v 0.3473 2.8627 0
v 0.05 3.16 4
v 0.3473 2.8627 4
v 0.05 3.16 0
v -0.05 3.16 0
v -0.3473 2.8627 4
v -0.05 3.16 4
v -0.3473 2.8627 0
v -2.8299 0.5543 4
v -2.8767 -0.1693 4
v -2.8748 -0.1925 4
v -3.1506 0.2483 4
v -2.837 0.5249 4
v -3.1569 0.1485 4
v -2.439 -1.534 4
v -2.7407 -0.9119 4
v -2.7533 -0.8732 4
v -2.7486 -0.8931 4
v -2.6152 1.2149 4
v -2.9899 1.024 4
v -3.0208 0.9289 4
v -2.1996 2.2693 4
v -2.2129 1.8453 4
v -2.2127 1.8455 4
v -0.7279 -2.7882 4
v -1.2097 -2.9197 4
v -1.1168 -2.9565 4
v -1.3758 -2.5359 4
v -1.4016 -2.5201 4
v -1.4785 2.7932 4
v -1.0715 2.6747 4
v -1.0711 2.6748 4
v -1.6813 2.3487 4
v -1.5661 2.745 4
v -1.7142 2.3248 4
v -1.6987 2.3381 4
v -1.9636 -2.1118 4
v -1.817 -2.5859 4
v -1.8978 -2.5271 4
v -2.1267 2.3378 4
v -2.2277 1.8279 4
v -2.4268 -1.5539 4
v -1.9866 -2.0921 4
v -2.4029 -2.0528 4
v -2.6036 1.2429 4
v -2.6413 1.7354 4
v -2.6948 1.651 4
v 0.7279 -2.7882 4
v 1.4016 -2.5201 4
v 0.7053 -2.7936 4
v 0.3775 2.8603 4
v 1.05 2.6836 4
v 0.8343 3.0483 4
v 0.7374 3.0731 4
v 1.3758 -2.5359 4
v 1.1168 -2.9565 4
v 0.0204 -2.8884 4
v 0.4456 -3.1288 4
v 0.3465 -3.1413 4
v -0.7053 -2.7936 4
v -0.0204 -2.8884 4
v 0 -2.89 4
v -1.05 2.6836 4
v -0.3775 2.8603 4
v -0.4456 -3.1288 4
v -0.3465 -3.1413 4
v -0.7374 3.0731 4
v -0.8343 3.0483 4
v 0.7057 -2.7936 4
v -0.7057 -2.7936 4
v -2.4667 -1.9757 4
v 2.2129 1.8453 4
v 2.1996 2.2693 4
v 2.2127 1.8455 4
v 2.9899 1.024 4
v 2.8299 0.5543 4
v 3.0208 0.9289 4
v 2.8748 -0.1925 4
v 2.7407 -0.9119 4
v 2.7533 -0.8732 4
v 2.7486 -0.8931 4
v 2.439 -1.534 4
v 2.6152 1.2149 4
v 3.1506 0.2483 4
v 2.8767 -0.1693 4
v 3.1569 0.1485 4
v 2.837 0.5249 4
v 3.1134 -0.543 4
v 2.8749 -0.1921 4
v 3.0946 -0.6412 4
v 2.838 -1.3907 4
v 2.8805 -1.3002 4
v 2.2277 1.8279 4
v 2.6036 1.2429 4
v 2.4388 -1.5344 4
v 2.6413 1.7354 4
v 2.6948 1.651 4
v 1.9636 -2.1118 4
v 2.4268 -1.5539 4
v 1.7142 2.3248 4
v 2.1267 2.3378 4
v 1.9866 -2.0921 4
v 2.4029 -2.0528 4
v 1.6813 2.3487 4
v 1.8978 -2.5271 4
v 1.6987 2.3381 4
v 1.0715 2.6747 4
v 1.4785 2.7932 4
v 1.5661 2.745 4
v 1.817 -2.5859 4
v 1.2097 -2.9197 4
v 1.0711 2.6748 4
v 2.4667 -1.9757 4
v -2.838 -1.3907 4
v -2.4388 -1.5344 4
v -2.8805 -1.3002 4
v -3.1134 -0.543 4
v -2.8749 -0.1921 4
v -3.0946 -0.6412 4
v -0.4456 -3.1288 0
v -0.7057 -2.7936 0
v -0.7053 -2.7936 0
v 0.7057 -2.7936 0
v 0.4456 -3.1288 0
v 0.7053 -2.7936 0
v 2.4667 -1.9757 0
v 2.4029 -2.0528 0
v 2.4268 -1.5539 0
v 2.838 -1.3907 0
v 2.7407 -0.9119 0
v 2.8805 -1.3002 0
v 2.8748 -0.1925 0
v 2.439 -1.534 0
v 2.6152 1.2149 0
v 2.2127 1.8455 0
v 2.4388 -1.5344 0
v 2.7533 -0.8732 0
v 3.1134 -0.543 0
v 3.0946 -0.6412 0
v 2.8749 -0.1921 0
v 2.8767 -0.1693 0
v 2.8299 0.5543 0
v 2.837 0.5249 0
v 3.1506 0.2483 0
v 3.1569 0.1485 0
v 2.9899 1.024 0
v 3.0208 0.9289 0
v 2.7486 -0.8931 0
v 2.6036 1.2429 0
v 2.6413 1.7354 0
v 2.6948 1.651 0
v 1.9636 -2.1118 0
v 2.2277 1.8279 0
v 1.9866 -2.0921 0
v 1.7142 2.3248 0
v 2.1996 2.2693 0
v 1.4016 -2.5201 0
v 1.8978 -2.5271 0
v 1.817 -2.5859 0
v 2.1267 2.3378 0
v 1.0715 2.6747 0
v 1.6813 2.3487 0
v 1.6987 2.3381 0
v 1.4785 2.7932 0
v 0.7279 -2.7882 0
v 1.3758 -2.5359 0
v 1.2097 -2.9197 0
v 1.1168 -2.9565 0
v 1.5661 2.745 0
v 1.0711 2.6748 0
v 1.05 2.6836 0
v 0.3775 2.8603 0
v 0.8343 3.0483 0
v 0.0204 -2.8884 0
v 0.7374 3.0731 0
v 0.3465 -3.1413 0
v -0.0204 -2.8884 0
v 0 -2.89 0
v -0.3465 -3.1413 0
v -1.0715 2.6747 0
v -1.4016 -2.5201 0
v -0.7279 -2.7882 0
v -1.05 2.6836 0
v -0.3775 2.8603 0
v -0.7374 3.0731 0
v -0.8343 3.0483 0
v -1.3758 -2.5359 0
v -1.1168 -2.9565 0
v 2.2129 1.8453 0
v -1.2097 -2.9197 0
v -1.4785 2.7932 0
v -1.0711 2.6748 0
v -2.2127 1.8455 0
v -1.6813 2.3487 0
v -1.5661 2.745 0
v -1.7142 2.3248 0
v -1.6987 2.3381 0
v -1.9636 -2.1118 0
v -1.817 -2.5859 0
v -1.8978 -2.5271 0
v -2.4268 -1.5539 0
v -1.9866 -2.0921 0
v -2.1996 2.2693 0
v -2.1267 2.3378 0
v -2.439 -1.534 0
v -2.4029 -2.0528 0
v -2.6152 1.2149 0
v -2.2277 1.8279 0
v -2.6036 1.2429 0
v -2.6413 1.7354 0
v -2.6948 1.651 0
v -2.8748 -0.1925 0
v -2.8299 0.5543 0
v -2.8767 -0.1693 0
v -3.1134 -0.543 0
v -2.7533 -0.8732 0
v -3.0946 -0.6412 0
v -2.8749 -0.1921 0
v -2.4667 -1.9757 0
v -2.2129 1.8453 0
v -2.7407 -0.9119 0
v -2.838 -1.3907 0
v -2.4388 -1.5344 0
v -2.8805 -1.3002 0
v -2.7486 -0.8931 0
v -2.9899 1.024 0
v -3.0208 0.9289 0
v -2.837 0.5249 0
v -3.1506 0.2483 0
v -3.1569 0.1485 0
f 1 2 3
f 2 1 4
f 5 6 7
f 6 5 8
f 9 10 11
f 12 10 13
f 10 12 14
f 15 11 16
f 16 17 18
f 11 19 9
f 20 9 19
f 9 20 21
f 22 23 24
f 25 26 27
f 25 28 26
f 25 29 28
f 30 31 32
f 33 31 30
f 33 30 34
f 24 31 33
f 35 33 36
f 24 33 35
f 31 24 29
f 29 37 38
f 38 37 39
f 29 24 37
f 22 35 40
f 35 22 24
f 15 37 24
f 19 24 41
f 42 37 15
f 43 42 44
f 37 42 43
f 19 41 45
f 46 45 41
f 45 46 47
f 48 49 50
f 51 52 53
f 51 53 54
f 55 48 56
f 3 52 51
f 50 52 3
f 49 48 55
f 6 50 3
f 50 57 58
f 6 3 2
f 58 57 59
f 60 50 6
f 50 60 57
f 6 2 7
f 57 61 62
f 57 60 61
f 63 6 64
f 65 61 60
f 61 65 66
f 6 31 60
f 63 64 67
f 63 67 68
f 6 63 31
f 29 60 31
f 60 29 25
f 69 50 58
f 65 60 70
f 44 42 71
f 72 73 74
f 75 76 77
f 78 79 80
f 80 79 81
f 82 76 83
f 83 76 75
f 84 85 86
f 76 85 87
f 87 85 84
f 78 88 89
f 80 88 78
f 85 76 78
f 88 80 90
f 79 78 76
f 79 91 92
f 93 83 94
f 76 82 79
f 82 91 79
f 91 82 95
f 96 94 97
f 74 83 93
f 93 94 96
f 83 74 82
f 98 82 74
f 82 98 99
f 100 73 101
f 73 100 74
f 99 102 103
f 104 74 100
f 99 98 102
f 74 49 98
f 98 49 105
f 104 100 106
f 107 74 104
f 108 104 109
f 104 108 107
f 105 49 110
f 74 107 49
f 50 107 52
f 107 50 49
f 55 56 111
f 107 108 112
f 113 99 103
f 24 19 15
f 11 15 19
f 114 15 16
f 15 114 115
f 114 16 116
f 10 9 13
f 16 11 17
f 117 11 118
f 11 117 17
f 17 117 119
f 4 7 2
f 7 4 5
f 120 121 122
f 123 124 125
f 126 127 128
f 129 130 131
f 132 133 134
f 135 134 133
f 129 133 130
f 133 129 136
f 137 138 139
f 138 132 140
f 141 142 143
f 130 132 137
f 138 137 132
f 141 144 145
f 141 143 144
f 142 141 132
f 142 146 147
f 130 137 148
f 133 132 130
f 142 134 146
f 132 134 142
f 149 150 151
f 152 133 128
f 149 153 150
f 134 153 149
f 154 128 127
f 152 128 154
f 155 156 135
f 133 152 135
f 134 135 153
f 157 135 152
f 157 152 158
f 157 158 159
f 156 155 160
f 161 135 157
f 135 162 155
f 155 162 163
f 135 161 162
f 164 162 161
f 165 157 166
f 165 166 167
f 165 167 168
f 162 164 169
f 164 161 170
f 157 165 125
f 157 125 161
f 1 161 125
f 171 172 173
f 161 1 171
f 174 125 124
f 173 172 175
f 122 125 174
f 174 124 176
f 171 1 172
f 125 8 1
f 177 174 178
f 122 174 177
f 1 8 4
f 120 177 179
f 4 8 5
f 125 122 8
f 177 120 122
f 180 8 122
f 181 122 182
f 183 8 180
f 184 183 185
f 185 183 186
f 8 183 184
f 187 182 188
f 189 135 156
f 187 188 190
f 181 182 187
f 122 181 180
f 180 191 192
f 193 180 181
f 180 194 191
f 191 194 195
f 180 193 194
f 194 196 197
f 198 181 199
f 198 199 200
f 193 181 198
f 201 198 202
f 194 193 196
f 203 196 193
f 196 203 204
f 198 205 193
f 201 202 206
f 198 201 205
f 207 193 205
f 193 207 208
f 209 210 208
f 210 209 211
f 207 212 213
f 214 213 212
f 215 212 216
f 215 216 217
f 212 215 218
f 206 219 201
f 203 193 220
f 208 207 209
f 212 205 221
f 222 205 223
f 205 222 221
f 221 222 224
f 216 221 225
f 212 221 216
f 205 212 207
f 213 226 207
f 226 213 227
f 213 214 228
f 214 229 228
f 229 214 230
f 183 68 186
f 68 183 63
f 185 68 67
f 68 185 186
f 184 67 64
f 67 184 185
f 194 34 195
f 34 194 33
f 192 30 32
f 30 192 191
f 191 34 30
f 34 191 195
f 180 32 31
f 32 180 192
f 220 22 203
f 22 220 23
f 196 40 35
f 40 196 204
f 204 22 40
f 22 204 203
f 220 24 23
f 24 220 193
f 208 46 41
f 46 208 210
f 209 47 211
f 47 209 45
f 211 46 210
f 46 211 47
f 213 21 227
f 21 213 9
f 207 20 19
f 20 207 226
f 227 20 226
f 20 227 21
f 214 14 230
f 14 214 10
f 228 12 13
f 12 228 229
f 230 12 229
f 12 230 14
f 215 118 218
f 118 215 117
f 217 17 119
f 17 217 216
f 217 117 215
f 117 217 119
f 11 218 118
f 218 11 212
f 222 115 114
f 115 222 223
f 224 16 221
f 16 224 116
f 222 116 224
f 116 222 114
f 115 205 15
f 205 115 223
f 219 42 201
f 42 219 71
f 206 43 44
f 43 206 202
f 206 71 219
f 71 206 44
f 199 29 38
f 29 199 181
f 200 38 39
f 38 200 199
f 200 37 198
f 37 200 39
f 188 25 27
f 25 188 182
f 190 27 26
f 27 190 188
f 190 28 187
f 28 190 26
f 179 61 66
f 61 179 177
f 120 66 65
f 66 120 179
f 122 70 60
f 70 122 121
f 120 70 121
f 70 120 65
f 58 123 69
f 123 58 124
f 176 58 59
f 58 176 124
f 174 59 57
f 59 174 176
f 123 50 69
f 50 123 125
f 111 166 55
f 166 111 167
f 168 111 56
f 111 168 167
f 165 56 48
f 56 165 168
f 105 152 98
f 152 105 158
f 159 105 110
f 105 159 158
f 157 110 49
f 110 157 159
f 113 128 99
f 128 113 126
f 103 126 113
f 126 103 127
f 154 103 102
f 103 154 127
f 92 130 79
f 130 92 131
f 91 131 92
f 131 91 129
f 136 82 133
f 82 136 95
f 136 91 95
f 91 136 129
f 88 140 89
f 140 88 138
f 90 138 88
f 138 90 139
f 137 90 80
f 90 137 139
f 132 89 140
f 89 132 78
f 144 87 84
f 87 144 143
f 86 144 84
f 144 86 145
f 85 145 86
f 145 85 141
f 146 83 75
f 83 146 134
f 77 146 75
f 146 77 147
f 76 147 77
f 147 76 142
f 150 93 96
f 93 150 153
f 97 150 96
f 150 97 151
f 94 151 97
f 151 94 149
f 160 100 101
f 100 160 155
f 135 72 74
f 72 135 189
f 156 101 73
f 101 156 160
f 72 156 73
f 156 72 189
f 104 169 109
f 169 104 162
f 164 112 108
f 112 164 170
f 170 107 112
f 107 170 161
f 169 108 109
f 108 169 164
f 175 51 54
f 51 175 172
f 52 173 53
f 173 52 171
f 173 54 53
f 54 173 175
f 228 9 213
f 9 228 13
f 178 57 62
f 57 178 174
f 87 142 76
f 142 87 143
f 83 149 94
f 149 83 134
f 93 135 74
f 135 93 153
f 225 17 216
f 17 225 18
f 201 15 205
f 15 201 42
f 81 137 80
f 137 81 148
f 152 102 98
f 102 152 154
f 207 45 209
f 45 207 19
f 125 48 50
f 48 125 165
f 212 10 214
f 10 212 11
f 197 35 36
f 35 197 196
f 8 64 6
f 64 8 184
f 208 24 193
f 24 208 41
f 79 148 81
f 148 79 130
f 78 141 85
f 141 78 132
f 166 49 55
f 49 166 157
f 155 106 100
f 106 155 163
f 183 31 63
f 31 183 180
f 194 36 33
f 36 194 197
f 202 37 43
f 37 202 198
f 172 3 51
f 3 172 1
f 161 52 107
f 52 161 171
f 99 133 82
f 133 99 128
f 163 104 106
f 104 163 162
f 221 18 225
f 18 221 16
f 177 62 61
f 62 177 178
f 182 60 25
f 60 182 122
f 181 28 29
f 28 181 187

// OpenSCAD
//https://github.com/hugokernel/OpenSCAD_ServoArms/blob/master/servo_arm.scad
/**
 *  Parametric servo arm generator for OpenScad
 *  Générateur de palonnier de servo pour OpenScad
 *
 *  Copyright (c) 2012 Charles Rincheval.  All rights reserved.
 *
 *  This library is free software; you can redistribute it and/or
 *  modify it under the terms of the GNU Lesser General Public
 *  License as published by the Free Software Foundation; either
 *  version 2.1 of the License, or (at your option) any later version.
 *
 *  This library is distributed in the hope that it will be useful,
 *  but WITHOUT ANY WARRANTY; without even the implied warranty of
 *  MERCHANTABILITY or FITNESS FOR A PARTICULAR PURPOSE.  See the GNU
 *  Lesser General Public License for more details.
 *
 *  You should have received a copy of the GNU Lesser General Public
 *  License along with this library; if not, write to the Free Software
 *  Foundation, Inc., 51 Franklin St, Fifth Floor, Boston, MA  02110-1301  USA
 *
 *  Last update :
 *  https://github.com/hugokernel/OpenSCAD_ServoArms
 *
 *  http://www.digitalspirit.org/
 */

$fn = 40;

/**
 *  Clear between arm head and servo head
 *  With PLA material, use clear : 0.3, for ABS, use 0.2
 */
SERVO_HEAD_CLEAR = 0.2;

/**
 *  Head / Tooth parameters
 *  Futaba 3F Standard Spline
 *  http://www.servocity.com/html/futaba_servo_splines.html
 *
 *  First array (head related) :
 *  0. Head external diameter
 *  1. Head heigth
 *  2. Head thickness
 *  3. Head screw diameter
 *
 *  Second array (tooth related) :
 *  0. Tooth count
 *  1. Tooth height
 *  2. Tooth length
 *  3. Tooth width
 */
FUTABA_3F_SPLINE = [
    [5.92, 4, 1.1, 2.5],
    [25, 0.3, 0.7, 0.1]
];

module servo_futaba_3f(length, count) {
    servo_arm(FUTABA_3F_SPLINE, [length, count]);
}

/**
 *  If you want to support a new servo, juste add a new spline definition array
 *  and a module named like servo_XXX_YYY where XXX is servo brand and YYY is the
 *  connection type (3f) or the servo type (s3003)
 */

module servo_standard(length, count) {
    servo_futaba_3f(length, count);
}

/**
 *  Tooth
 *
 *    |<-w->|
 *    |_____|___
 *    /     \  ^h
 *  _/       \_v
 *   |<--l-->|
 *
 *  - tooth length (l)
 *  - tooth width (w)
 *  - tooth height (h)
 *  - height
 *
 */
module servo_head_tooth(length, width, height, head_height) {
    linear_extrude(height = head_height) {
        polygon([[-length / 2, 0], [-width / 2, height], [width / 2, height], [length / 2,0]]);
    }
}

/**
 *  Servo head
 */
module servo_head(params = FUTABA_3F_SPLINE, clear = SERVO_HEAD_CLEAR) {

    head = params[0];
    tooth = params[1];

    head_diameter = head[0];
    head_heigth = head[1];

    tooth_count = tooth[0];
    tooth_height = tooth[1];
    tooth_length = tooth[2];
    tooth_width = tooth[3];

    % cylinder(r = head_diameter / 2, h = head_heigth + 1);

    cylinder(r = head_diameter / 2 - tooth_height + 0.03 + clear, h = head_heigth);

    for (i = [0 : tooth_count]) {
        rotate([0, 0, i * (360 / tooth_count)]) {
            translate([0, head_diameter / 2 - tooth_height + clear, 0]) {
                servo_head_tooth(tooth_length, tooth_width, tooth_height, head_heigth);
            }
        }
    }
}

/**
 *  Servo hold
 *  - Head / Tooth parameters
 *  - Arms params (length and count)
 */
module servo_arm(params, arms) {

    head = params[0];
    tooth = params[1];

    head_diameter = head[0];
    head_heigth = head[1];
    head_thickness = head[2];
    head_screw_diameter = head[3];

    tooth_length = tooth[2];
    tooth_width = tooth[3];

    arm_length = arms[0];
    arm_count = arms[1];

    /**
     *  Servo arm
     *  - length is from center to last hole
     */
    module arm(tooth_length, tooth_width, head_height, head_heigth, hole_count = 1) {

        arm_screw_diameter = 2;

        difference() {
            union() {
                cylinder(r = tooth_width / 2, h = head_heigth);

                linear_extrude(height = head_heigth) {
                    polygon([
                        [-tooth_width / 2, 0], [-tooth_width / 3, tooth_length],
                        [tooth_width / 3, tooth_length], [tooth_width / 2, 0]
                    ]);
                }

                translate([0, tooth_length, 0]) {
                    cylinder(r = tooth_width / 3, h = head_heigth);
                }

                if (tooth_length >= 12) {
                    translate([-head_heigth / 2 + 2, 3.8, -4]) {
                        rotate([90, 0, 0]) {
                            rotate([0, -90, 0]) {
                                linear_extrude(height = head_heigth) {
                                    polygon([
                                        [-tooth_length / 1.7, 4], [0, 4], [0, - head_height + 5],
                                        [-2, - head_height + 5]
                                    ]);
                                }
                            }
                        }
                    }
                }
            }

            // Hole
            for (i = [0 : hole_count - 1]) {
                //translate([0, length - (length / hole_count * i), -1]) {
                translate([0, tooth_length - (4 * i), -1]) {
                    cylinder(r = arm_screw_diameter / 2, h = 10);
                }
            }

            cylinder(r = head_screw_diameter / 2, h = 10);
        }
    }

    difference() {
        translate([0, 0, 0.1]) {
            cylinder(r = head_diameter / 2 + head_thickness, h = head_heigth + 1);
        }

        cylinder(r = head_screw_diameter / 2, h = 10);

        !servo_head(params);
    }

    arm_thickness = head_thickness;

    // Arm
    translate([0, 0, head_heigth]) {
        for (i = [0 : arm_count - 1]) {
            rotate([0, 0, i * (360 / arm_count)]) {
                arm(arm_length, head_diameter + arm_thickness * 2, head_heigth, 2);
            }
        }
    }
}

module demo() {
    rotate([0, 180, 0])
        servo_standard(20, 4);
}

demo();
